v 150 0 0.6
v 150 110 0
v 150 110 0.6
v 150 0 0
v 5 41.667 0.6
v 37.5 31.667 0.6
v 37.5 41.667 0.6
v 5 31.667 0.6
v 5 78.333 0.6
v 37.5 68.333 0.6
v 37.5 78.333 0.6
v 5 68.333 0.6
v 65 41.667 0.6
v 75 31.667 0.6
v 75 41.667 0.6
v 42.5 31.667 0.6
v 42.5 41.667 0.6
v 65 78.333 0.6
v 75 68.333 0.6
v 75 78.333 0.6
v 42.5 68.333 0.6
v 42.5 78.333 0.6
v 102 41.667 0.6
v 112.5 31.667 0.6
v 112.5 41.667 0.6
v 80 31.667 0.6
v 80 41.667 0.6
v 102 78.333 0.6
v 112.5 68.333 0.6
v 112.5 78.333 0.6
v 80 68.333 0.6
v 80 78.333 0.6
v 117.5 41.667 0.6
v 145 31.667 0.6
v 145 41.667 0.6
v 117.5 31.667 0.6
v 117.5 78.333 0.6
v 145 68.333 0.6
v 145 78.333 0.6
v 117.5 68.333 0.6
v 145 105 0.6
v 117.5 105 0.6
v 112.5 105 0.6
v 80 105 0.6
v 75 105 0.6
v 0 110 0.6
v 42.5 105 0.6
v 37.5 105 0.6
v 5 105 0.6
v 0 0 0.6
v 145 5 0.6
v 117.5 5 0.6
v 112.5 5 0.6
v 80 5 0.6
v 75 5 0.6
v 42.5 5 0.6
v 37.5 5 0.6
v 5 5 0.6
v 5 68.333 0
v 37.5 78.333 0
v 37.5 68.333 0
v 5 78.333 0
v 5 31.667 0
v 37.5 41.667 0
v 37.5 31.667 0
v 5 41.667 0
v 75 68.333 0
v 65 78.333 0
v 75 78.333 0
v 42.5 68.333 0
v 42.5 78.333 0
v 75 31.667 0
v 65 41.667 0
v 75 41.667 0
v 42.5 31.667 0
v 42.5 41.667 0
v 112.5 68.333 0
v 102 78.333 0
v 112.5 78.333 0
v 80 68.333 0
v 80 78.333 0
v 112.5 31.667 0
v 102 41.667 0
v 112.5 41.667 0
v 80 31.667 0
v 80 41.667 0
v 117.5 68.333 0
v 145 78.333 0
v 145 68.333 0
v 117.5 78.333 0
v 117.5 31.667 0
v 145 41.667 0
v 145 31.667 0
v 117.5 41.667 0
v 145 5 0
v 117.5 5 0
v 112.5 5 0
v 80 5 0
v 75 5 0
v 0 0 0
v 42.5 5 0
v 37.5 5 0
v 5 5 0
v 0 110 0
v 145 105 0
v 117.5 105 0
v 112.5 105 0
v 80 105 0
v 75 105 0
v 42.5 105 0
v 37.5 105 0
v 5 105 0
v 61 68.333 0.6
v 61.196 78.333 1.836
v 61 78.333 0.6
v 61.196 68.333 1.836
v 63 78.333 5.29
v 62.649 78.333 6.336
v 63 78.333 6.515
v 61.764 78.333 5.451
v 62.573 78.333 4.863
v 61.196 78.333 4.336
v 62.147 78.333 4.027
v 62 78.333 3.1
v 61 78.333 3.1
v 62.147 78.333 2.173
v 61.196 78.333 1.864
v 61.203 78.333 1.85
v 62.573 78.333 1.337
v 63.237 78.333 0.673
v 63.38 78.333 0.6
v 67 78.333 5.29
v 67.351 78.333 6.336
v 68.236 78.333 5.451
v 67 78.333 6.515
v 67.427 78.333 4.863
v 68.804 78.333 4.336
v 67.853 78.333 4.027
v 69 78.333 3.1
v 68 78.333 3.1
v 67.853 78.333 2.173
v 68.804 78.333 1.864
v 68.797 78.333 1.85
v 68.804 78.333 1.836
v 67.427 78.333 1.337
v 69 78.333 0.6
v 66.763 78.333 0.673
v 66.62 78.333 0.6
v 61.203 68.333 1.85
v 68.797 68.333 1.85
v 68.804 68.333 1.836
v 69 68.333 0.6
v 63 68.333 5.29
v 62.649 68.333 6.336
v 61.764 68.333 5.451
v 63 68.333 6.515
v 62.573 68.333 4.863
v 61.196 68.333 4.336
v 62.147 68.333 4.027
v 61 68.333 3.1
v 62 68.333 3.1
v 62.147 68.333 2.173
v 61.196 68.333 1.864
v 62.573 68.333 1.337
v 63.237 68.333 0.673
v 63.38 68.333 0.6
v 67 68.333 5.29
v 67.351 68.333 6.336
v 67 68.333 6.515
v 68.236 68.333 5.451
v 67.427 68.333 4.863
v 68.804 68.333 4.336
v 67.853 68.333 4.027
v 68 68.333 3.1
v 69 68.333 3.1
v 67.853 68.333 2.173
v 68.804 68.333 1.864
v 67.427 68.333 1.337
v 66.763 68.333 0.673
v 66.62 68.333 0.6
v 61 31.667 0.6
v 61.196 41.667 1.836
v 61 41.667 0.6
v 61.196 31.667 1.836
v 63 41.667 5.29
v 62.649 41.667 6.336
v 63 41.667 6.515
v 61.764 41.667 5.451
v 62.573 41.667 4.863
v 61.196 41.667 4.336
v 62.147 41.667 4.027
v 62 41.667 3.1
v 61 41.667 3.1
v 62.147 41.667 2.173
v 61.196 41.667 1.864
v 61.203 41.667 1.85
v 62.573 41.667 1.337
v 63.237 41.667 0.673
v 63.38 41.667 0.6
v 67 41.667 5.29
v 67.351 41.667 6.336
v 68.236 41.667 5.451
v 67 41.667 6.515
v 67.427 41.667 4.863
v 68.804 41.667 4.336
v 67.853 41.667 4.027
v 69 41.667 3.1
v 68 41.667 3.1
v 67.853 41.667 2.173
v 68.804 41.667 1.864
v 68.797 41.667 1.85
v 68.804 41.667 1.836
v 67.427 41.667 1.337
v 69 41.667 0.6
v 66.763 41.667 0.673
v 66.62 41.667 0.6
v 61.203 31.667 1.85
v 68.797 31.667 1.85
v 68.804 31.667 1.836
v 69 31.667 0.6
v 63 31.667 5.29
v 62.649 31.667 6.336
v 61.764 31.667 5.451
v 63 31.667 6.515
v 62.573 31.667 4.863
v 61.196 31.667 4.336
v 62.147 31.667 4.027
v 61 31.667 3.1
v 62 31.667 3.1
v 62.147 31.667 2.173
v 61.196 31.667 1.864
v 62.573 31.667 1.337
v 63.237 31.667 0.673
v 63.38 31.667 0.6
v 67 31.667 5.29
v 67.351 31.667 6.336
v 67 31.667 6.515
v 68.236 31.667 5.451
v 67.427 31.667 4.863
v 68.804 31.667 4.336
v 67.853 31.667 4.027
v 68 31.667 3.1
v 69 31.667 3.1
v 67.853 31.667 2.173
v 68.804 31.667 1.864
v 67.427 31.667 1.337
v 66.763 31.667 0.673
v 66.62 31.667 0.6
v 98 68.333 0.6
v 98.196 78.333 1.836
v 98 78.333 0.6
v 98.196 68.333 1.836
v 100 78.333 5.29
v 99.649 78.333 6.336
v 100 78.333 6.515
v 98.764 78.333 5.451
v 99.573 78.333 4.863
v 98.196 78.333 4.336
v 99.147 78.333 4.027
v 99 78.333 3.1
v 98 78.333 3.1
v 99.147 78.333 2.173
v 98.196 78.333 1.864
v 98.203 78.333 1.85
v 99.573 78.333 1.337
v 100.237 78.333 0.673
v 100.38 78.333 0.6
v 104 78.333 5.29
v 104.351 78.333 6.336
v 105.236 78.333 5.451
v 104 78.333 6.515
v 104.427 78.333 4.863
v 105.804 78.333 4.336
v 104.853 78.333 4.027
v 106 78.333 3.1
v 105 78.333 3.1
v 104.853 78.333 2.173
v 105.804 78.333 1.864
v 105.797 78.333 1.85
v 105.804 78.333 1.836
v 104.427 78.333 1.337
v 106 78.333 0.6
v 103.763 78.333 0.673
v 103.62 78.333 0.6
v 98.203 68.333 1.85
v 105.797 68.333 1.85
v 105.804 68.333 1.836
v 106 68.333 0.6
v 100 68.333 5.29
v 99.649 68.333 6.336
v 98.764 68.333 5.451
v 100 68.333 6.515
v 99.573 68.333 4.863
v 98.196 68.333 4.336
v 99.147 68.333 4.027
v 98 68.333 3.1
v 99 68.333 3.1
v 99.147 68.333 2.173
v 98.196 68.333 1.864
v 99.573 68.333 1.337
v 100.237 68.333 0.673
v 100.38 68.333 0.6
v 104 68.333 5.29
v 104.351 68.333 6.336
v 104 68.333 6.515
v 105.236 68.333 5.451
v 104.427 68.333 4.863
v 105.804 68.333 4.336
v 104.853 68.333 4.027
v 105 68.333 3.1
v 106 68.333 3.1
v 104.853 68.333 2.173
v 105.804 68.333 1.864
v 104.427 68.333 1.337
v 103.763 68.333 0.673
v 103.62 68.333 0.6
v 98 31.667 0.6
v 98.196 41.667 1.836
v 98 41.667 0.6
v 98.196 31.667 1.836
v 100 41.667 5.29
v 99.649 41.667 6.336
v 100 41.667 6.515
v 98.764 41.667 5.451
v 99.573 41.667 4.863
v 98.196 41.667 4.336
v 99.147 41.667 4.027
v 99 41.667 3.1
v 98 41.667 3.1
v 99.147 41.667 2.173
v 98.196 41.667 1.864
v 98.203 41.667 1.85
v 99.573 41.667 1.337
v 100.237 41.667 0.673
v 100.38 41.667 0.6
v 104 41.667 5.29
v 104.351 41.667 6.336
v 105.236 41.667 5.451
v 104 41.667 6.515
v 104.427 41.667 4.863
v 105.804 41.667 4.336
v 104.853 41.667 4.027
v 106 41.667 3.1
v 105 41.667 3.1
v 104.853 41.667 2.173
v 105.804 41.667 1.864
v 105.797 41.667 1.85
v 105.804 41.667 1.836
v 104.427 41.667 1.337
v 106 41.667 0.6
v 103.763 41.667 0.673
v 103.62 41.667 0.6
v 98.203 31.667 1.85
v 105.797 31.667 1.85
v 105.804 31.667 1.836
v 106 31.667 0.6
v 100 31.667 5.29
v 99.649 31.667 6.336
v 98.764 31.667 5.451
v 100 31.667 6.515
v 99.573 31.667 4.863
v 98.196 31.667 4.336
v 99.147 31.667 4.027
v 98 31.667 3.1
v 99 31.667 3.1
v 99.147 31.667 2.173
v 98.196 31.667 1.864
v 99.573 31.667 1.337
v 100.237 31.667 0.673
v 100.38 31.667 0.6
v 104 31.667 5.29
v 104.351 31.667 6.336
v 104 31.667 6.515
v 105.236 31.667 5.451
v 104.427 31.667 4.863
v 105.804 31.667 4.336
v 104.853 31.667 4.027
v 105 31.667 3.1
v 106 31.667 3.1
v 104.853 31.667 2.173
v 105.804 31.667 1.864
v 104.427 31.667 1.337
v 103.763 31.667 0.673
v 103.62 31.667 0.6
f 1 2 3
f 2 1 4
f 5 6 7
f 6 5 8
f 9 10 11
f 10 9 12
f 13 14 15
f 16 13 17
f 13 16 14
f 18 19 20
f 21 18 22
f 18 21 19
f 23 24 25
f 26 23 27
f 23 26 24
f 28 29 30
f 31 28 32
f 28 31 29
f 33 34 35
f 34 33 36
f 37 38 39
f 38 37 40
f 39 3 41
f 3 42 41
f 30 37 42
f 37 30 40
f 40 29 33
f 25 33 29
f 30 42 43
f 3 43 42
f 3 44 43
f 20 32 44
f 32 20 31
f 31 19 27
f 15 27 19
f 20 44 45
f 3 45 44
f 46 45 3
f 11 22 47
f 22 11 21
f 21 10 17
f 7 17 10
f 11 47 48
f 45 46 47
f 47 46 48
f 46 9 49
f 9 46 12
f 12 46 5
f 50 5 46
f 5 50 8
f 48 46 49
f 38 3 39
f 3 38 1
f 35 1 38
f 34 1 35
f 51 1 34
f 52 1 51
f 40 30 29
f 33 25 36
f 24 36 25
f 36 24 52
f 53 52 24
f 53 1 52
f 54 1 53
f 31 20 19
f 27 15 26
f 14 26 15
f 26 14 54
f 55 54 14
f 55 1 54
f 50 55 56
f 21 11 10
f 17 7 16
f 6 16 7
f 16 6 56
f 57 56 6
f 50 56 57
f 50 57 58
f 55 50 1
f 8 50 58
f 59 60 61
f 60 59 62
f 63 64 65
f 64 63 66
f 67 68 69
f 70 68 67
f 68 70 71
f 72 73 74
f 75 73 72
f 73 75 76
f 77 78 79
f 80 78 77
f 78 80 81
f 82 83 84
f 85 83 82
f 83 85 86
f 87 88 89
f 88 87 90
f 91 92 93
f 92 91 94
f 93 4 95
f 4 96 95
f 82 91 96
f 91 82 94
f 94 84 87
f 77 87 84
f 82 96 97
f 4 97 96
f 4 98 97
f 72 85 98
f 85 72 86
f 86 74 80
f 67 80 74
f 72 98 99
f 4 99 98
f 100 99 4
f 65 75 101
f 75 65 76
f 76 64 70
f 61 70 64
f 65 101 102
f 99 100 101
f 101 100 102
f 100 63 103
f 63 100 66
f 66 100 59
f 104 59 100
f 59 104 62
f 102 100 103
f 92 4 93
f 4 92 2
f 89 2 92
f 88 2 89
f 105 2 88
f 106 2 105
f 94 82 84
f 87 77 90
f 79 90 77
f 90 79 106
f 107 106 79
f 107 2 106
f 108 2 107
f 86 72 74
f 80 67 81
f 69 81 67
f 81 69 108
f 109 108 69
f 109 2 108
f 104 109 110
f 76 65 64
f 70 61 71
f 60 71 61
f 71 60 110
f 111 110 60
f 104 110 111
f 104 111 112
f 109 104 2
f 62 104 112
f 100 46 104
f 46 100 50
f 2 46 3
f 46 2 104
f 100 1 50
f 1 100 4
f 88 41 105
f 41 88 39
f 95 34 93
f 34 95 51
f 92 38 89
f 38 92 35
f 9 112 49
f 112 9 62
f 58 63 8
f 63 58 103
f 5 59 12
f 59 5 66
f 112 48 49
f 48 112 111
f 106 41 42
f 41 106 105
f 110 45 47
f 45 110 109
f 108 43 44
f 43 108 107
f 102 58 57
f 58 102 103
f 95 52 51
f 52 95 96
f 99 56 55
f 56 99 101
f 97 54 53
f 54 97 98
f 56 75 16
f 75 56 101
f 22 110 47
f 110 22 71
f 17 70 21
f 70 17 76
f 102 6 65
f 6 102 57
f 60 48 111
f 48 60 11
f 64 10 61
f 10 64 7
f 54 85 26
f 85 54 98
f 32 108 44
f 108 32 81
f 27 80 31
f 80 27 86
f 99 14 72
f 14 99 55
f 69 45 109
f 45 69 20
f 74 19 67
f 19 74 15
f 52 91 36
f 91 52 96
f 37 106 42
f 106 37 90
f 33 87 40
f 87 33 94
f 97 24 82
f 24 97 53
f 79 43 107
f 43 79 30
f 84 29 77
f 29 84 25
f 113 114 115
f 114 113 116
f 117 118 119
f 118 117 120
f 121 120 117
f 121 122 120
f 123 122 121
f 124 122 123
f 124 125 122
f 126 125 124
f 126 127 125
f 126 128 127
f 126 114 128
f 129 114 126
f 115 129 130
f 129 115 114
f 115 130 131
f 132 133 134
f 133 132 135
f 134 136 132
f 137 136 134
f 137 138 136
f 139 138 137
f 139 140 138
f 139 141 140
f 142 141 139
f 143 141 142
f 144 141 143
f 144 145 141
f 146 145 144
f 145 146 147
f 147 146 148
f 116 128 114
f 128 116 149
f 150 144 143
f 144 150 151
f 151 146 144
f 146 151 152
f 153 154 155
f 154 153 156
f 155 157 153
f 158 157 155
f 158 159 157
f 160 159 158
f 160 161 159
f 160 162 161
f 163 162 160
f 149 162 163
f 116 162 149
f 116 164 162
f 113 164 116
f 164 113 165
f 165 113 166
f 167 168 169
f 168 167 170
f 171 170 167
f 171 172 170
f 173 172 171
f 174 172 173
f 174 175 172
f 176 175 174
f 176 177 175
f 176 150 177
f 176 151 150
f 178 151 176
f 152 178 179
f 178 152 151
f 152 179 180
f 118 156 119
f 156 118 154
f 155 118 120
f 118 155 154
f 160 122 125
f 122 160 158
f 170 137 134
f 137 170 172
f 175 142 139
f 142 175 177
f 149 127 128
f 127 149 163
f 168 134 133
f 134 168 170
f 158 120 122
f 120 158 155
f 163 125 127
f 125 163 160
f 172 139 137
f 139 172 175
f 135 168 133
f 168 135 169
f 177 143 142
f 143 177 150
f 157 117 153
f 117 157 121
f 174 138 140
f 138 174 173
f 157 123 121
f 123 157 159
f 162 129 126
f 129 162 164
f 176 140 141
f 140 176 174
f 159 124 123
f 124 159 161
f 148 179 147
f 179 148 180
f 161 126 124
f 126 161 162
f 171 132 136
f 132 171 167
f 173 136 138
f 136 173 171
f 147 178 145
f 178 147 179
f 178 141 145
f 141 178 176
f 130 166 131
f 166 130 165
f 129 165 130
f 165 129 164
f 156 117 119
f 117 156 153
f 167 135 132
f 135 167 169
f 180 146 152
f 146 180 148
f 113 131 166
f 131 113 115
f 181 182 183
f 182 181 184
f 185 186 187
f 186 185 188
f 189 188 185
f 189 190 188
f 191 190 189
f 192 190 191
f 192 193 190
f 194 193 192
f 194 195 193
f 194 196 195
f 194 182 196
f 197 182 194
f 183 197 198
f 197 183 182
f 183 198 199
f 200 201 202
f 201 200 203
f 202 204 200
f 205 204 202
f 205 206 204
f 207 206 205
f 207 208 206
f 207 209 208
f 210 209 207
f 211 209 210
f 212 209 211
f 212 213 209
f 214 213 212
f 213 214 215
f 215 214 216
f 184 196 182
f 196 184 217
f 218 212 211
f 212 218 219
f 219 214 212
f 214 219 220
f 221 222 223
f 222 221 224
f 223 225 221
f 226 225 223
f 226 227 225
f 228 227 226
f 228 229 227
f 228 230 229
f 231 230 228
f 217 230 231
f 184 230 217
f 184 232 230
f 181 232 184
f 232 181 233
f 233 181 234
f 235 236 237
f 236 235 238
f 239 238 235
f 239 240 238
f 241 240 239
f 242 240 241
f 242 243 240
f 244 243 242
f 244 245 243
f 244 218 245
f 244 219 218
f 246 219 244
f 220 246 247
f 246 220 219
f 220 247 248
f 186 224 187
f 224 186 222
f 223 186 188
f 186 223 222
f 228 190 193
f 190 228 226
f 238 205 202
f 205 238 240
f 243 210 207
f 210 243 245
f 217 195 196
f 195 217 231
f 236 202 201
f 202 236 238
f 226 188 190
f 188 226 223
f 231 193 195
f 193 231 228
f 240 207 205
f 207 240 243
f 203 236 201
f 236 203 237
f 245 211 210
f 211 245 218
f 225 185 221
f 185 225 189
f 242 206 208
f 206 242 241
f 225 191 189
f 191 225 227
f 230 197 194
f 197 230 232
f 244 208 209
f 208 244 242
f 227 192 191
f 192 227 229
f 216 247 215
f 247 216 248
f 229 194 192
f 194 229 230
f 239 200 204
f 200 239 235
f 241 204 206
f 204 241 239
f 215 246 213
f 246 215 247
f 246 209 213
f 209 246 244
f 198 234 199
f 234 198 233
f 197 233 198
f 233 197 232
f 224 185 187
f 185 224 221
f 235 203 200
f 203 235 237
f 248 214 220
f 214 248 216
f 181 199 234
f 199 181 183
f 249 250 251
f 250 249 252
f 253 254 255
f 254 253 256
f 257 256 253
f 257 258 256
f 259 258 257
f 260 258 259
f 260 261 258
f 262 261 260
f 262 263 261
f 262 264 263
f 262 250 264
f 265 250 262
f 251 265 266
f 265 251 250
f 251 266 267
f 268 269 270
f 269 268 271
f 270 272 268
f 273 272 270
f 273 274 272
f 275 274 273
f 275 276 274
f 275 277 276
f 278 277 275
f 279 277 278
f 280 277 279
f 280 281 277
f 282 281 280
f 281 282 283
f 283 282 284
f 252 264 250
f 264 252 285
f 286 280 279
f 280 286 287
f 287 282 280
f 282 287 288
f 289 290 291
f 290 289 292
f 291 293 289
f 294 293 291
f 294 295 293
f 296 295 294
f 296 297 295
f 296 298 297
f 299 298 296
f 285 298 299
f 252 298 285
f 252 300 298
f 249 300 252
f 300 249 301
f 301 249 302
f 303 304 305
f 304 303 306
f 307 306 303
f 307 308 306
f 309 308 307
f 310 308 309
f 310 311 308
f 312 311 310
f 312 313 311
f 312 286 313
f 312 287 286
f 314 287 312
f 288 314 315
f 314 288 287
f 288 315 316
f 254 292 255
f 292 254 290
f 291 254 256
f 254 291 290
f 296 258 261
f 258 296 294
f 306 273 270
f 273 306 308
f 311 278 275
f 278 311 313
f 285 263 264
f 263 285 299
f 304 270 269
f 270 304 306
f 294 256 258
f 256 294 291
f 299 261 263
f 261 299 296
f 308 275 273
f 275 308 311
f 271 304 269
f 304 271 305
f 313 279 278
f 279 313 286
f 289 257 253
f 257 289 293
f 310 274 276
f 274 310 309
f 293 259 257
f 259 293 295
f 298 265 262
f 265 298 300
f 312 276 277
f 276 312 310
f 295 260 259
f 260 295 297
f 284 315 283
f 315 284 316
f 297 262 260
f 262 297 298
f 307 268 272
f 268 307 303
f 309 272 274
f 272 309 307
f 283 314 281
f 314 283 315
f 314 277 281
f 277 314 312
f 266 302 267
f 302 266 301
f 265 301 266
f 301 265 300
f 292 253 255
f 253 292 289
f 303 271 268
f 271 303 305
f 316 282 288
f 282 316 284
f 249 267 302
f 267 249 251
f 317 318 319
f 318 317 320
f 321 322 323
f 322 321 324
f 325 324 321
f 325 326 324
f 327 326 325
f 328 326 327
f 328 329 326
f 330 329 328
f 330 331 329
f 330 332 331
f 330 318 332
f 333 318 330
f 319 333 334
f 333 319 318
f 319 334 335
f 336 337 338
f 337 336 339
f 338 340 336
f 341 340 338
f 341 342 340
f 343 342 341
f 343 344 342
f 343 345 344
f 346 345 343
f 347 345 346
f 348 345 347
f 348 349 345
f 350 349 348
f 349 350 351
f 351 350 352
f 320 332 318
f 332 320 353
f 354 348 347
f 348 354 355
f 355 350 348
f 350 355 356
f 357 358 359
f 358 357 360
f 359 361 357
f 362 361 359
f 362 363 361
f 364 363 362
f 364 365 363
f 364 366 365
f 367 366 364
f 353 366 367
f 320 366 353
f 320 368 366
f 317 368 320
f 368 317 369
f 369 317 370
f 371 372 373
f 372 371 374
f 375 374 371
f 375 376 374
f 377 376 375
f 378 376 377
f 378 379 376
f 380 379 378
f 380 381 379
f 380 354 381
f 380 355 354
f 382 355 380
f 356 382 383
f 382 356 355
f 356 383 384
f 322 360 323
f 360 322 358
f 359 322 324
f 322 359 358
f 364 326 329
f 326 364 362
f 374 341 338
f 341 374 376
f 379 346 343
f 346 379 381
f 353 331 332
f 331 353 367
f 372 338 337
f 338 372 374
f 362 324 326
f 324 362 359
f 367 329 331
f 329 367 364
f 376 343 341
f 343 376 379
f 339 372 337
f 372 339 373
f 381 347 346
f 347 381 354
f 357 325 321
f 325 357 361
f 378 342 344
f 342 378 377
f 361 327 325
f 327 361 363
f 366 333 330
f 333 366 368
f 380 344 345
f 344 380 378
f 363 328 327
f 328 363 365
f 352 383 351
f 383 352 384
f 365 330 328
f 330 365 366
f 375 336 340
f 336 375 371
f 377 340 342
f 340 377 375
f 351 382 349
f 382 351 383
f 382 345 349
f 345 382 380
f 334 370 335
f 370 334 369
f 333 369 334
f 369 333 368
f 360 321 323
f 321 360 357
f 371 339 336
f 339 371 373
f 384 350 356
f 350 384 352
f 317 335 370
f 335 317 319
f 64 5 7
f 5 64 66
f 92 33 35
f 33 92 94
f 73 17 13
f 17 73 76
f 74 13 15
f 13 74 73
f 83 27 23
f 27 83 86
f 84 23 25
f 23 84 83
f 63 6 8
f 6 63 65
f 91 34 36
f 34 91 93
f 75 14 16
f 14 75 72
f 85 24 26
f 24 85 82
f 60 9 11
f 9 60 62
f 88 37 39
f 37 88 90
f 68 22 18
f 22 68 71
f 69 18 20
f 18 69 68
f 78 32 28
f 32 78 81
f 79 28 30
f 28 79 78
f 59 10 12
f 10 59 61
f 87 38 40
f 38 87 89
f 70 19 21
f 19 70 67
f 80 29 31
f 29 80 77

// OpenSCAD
$fn=20;
/*
  Dishwasher Detergent Dispenser Guard 
  Default Values: Whirlpool ADP6000WH
  Brian Khuu 2019
  
  
  
*/

// Thickness
thickness=0.6;

// Wire Diameter
wire_dia=5;

// Wire Tolerance
wire_tol=1;

// Height
h=150;

// Width
w=110;

// Distance from bottom of first wire
c1=60;

// Distance from bottom of second wire
c2=c1+32+wire_dia;



module dishwasher_grid(h, w, thickness, wire_dia, wire_tol, c1, c2)
{
  module clip( wire_dia, baseh )
  {
    rotate([0,-90,90])
    union()
    {
      translate([baseh,0,0])
      difference()
      {
        union()
        {
          cylinder(r=(wire_dia+wire_tol)/2+1, h=wire_dia*2, center=true);
          translate([wire_dia/2,0,0])
            cylinder(r=(wire_dia+wire_tol)/2+1, h=wire_dia*2, center=true);
        }
        translate([wire_dia/2,0,0])
          cylinder(r=(wire_dia+wire_tol)/2, h=20, center=true);
        translate([wire_dia,0,0])
          cube([wire_dia,(wire_dia-1),wire_dia*3],center=true);
        translate([-wire_dia*4,-wire_dia*2,-wire_dia*2])
          cube([wire_dia*4, wire_dia*4, wire_dia*4]);
      }
      translate([baseh/2,0,0])
        rotate([0,90,0])
          cylinder(r=wire_dia, h=baseh, center=true);
    }
  }

  module clip_stick(baseh)
  {
    translate([wire_dia,w*2/3,0])
      clip(wire_dia,baseh);
    translate([wire_dia,w*1/3,0])
      clip(wire_dia,baseh);
  }
  
  // Frame
  difference()
  {
    cube([h,w,thickness]);
    translate([h/2,w/2,0])
      cube([h-wire_dia*2,w-wire_dia*2,thickness*3],center=true);
  }


  // Hoz Grid
  for(hi=[1:1:3])
  {
    translate([h*hi/4,0,0])
      cube([wire_dia,w,thickness]);
  }

  // Vertical Grid
  translate([0,w*1/3-wire_dia,0])
    cube([h,wire_dia*2,thickness]);
  translate([0,w*2/3-wire_dia,0])
    cube([h,wire_dia*2,thickness]);


  // Clips
  translate([c1,0,0])
    clip_stick(thickness);
  translate([c2,0,0])
    clip_stick(thickness);
}

dishwasher_grid(h, w, thickness, wire_dia, wire_tol, c1, c2);
